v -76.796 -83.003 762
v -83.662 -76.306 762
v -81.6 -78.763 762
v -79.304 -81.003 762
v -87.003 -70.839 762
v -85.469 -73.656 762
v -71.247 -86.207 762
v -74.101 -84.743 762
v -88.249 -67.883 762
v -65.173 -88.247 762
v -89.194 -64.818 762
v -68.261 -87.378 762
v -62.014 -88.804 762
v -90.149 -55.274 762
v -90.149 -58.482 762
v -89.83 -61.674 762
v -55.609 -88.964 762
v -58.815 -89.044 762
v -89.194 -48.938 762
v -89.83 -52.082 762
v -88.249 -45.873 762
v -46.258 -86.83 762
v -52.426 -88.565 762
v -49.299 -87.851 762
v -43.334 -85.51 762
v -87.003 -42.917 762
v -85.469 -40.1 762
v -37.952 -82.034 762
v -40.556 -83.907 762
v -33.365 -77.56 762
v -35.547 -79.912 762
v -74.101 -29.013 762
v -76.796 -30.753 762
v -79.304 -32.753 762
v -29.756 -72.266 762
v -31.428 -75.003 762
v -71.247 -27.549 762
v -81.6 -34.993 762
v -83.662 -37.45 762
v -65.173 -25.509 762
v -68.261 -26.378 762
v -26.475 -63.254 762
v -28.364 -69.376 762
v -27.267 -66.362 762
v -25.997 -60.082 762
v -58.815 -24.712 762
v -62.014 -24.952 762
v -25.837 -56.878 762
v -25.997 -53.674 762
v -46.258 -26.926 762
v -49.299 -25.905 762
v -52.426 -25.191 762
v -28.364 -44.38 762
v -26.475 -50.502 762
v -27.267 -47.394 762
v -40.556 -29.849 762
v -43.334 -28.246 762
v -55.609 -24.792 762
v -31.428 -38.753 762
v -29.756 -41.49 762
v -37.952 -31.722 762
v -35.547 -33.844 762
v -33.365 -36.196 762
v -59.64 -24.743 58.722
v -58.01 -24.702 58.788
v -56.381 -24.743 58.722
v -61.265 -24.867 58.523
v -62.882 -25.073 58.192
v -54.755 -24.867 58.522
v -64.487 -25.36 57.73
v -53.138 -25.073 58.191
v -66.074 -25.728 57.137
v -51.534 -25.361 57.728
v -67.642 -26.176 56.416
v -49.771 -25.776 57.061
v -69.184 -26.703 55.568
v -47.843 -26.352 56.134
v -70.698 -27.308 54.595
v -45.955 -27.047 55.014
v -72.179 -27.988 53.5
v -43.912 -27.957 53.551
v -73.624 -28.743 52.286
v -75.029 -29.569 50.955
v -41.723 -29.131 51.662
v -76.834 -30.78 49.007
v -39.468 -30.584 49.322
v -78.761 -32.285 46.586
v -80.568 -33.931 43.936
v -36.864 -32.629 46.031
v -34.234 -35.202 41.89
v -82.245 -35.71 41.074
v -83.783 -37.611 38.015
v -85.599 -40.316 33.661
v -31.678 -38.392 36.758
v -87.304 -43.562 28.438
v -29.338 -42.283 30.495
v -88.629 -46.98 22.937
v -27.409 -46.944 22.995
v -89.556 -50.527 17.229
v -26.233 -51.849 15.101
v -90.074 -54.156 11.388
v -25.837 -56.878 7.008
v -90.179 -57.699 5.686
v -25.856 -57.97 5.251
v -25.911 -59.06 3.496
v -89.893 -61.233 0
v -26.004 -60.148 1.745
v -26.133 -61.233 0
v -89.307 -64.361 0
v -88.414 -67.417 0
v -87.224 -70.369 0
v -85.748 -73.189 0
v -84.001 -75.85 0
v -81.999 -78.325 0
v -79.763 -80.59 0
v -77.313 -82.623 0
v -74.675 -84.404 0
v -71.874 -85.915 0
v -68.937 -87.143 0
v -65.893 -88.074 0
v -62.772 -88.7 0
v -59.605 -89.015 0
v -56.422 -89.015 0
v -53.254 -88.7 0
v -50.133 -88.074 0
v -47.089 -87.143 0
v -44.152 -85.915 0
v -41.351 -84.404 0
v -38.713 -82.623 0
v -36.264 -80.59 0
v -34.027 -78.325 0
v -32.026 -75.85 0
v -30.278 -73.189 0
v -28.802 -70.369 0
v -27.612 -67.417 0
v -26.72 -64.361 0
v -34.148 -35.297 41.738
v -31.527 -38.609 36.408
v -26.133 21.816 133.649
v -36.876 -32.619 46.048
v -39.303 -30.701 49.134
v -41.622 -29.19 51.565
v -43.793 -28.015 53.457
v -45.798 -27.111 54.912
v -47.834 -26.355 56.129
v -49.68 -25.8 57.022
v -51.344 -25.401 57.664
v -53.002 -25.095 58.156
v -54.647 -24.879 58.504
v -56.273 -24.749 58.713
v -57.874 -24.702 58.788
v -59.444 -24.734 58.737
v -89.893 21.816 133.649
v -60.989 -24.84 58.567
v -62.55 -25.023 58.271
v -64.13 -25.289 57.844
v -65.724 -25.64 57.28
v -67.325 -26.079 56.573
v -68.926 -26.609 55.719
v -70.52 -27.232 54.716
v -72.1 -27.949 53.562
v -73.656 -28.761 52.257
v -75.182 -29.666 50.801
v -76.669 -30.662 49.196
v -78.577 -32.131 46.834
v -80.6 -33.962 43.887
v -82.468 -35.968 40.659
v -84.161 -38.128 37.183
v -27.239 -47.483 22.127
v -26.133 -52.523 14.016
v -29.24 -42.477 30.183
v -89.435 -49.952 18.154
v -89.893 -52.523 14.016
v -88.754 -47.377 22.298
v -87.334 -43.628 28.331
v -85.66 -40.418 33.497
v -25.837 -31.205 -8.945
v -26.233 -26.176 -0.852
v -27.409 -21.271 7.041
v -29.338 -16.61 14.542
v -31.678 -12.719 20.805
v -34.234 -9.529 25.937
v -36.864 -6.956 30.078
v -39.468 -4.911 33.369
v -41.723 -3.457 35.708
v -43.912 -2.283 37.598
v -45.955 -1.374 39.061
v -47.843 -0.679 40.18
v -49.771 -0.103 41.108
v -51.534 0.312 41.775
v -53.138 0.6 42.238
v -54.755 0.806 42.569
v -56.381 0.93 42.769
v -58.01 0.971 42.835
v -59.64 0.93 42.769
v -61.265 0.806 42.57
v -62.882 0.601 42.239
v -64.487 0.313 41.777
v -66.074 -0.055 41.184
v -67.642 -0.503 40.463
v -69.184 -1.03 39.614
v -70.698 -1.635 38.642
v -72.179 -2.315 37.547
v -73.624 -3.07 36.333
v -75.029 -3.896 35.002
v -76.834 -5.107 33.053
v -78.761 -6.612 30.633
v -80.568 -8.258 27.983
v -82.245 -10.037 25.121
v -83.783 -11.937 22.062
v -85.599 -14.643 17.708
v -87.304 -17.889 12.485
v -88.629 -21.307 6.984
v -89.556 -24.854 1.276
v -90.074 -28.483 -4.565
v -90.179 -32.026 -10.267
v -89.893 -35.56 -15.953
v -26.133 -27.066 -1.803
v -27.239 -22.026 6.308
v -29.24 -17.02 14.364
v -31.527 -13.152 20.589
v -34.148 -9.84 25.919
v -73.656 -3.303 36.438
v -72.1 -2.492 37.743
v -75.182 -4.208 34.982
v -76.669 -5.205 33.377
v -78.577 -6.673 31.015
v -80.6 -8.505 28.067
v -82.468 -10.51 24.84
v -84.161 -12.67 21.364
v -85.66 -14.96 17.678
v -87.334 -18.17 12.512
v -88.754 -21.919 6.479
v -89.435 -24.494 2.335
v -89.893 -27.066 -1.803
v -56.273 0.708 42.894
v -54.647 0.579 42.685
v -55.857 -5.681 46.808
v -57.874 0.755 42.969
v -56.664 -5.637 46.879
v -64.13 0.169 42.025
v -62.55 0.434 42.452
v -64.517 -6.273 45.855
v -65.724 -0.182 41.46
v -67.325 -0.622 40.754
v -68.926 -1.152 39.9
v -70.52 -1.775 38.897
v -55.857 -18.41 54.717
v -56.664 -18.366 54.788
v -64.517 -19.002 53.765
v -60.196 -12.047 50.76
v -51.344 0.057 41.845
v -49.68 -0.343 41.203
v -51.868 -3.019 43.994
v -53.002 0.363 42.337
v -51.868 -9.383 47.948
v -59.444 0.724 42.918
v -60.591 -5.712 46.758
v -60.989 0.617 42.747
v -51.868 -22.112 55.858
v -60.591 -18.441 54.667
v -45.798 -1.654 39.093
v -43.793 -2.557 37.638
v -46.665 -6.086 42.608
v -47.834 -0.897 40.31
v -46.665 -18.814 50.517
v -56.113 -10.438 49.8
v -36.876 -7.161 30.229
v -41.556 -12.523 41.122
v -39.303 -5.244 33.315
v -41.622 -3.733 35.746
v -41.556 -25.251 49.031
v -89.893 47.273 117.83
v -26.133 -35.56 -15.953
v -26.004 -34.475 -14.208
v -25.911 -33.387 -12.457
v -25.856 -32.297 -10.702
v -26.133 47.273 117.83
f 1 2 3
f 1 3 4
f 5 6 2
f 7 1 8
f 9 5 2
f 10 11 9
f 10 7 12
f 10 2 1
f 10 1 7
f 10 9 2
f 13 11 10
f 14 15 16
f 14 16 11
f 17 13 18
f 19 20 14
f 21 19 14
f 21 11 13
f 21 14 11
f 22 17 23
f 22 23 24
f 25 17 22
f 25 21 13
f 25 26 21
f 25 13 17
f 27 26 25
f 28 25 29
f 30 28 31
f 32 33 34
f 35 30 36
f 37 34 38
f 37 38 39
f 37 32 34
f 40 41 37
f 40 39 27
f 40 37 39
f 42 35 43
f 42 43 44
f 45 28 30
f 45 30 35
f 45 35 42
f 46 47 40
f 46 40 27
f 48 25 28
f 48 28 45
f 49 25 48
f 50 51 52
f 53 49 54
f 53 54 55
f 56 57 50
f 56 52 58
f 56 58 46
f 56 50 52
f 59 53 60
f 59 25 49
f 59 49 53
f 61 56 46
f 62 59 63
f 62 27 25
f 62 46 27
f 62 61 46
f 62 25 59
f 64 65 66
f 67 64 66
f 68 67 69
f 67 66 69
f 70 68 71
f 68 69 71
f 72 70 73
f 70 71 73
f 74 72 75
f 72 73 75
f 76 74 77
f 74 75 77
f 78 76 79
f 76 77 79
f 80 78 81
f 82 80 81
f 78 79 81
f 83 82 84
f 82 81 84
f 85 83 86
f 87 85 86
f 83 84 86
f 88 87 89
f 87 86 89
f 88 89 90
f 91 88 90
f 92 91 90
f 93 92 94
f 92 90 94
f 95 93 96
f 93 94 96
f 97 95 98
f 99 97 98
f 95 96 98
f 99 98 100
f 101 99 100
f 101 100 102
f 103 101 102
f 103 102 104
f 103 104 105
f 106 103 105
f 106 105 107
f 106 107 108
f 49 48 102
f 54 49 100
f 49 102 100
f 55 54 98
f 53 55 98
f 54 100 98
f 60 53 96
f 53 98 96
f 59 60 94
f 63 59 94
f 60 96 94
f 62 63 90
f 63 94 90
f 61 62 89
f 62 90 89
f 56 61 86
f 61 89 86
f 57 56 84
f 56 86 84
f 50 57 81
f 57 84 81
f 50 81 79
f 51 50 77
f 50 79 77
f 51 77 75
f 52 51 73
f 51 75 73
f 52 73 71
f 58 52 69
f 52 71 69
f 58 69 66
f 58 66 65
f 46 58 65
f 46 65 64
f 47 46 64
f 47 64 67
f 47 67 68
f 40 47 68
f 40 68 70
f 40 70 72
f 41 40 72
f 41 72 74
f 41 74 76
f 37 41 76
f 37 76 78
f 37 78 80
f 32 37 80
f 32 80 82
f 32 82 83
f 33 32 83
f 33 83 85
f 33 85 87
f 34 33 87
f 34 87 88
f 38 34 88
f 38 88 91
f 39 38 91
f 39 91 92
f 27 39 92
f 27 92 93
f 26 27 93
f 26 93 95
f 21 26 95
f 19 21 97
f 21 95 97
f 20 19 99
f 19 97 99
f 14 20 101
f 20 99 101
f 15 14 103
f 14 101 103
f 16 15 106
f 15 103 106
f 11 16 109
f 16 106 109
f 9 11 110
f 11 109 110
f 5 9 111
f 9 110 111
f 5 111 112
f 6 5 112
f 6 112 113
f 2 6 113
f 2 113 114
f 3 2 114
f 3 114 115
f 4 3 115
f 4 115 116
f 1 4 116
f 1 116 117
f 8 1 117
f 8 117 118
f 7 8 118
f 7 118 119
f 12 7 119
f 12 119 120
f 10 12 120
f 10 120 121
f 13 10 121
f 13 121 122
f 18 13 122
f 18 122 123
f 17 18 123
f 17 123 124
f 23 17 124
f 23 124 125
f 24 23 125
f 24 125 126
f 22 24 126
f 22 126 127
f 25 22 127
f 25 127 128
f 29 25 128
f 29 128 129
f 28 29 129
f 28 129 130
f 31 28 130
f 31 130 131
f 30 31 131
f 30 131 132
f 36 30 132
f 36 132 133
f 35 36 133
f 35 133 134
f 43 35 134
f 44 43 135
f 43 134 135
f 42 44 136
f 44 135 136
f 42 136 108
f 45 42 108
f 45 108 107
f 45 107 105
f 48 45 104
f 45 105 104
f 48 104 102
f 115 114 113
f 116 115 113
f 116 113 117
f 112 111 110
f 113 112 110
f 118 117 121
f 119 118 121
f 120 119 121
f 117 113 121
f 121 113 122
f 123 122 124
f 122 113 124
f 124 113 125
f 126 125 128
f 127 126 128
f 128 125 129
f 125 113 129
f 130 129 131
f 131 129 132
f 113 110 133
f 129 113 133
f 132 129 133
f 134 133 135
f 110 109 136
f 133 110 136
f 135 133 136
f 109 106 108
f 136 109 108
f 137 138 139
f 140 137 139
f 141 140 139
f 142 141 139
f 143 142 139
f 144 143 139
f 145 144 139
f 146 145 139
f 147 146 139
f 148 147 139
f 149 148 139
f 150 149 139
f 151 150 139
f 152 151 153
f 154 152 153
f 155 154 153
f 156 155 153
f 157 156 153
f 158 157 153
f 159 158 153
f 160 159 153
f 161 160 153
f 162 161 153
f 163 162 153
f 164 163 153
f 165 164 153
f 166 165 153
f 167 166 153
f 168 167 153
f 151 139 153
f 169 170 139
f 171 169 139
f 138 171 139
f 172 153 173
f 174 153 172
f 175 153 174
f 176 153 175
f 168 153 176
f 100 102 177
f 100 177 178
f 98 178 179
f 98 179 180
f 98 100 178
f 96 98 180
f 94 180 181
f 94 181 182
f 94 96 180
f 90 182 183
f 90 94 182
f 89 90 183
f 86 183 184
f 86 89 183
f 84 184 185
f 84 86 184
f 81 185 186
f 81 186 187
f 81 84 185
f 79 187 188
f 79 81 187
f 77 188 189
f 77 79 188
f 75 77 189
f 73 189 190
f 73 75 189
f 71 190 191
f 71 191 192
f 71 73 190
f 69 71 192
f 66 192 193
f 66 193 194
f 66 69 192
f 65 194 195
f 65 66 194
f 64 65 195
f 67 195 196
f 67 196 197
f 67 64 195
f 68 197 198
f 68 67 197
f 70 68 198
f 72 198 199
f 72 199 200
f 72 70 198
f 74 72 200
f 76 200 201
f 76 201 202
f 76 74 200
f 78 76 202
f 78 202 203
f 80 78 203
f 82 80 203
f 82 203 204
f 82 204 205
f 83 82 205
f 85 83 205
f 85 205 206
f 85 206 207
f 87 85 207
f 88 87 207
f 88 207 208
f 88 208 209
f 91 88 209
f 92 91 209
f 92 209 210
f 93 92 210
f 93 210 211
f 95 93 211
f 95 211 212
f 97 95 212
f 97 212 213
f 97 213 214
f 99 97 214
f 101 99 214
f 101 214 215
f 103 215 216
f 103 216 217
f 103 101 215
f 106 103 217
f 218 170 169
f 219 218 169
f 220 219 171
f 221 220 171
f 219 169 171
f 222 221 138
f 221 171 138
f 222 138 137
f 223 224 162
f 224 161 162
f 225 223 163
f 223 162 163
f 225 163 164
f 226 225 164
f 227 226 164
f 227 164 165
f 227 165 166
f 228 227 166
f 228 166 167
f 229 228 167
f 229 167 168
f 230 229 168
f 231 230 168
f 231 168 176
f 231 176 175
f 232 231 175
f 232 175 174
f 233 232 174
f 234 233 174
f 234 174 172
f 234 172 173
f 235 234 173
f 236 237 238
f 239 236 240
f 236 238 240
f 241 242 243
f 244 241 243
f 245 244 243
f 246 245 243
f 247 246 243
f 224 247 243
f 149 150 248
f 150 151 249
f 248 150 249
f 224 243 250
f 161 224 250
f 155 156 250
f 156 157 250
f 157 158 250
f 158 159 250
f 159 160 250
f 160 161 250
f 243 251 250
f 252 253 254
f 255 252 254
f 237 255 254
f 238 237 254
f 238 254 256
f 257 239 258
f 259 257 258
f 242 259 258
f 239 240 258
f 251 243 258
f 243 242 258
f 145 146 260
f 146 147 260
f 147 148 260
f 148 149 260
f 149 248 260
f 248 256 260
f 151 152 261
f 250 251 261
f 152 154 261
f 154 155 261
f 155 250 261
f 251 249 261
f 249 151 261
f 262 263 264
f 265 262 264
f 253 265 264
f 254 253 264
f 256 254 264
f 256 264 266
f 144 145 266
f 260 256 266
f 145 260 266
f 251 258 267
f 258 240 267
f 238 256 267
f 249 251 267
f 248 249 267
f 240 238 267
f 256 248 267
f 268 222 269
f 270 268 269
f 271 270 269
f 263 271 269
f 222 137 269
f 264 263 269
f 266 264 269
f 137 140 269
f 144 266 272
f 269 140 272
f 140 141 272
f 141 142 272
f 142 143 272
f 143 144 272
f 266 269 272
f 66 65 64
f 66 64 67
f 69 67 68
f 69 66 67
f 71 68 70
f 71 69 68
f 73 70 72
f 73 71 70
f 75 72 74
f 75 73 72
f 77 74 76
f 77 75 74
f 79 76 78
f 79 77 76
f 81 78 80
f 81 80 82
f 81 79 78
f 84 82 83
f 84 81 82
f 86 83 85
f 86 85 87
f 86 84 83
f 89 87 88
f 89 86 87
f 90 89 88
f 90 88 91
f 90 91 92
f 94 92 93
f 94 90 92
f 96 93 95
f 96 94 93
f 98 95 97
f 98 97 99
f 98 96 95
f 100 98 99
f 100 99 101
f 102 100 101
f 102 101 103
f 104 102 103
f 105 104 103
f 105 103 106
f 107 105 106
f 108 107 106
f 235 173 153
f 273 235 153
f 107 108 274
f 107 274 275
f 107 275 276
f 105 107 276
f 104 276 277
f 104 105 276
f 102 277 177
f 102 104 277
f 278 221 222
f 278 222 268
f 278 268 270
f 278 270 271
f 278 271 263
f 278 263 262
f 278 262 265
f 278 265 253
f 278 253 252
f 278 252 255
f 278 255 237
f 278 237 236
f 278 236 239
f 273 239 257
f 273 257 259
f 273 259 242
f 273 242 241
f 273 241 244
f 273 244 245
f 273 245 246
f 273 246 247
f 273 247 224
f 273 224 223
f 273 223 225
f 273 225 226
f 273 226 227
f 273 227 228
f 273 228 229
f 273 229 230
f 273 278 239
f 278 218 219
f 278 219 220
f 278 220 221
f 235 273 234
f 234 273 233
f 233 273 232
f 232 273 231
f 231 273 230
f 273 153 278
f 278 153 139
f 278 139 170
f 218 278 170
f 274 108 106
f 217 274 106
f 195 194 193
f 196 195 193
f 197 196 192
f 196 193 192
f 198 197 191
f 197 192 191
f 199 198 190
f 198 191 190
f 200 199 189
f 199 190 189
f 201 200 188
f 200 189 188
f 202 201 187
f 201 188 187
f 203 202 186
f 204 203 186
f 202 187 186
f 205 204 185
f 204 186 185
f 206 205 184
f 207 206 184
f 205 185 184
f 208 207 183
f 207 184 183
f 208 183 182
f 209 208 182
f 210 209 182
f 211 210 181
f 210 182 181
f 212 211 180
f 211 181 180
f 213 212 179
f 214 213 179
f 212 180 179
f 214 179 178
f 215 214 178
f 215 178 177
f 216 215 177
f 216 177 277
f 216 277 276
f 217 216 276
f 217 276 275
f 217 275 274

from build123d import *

# Parameters (mm, degrees)
F0_R     = 32.1759742661
F1_DEPTH = 762
F3_DEPTH = 146.558
F5_DEPTH = 29.972
F6_DEPTH = 30.226


with BuildPart() as f1:
    # F0 (on Top) → F1 (new body)
    with BuildSketch(Plane.XY):
        with Locations((-58.0132268369, -56.8779930472)):
            Circle(F0_R)
    extrude(amount=F1_DEPTH)

    # F2 (on Right) → F3 (cut)
    with BuildSketch(Plane.YZ):
        Polygon((13.2061298937, 119.7934225202), (-61.2327568233, 0), (13.2061298937, 0), align=None)
    extrude(amount=-F3_DEPTH, mode=Mode.SUBTRACT)


with BuildPart() as f5:
    # F4 (on face) → F5 (new body)
    with BuildSketch(Plane(origin=(0, -44.1753277783, 27.4502735709), x_dir=(-1, 0, 0), z_dir=(0, 0.8493720857, -0.5277945244))):
        with BuildLine():
            Line((26.1333060022, 125.0323653221), (26.1333060022, -15.816574645))
            add(Edge.make_bspline(
                [(26.1333060022, -15.816574645), (30.202068166, 40.6186237964), (60.1956346345, 36.7552322349), (86.3457649102, 33.3869034719), (89.8931476716, -15.816574645)],
                knots=[1.718887012, 1.718887012, 1.718887012, 3.2094720169, 3.2094720169, 4.5589604325, 4.5589604325, 4.5589604325], degree=2, weights=[0.947833532, 0.7113798115, 1, 0.738700175, 0.9077735947]))
            Line((89.8931476716, -15.816574645), (89.8931476716, 125.0323653221))
            Line((89.8931476716, 125.0323653221), (26.1333060022, 125.0323653221))
        make_face()
    extrude(amount=F5_DEPTH)


with BuildPart() as f6:
    # F6 (new): a face of the model
    f6_faces = [f1.part.faces().sort_by_distance(p)[0] for p in [
        (-58.0132268369, -45.5428924502, 25.2494715468),
    ]]
    extrude(f6_faces, amount=F6_DEPTH)


solid = Compound([f1.part, f5.part, f6.part])
